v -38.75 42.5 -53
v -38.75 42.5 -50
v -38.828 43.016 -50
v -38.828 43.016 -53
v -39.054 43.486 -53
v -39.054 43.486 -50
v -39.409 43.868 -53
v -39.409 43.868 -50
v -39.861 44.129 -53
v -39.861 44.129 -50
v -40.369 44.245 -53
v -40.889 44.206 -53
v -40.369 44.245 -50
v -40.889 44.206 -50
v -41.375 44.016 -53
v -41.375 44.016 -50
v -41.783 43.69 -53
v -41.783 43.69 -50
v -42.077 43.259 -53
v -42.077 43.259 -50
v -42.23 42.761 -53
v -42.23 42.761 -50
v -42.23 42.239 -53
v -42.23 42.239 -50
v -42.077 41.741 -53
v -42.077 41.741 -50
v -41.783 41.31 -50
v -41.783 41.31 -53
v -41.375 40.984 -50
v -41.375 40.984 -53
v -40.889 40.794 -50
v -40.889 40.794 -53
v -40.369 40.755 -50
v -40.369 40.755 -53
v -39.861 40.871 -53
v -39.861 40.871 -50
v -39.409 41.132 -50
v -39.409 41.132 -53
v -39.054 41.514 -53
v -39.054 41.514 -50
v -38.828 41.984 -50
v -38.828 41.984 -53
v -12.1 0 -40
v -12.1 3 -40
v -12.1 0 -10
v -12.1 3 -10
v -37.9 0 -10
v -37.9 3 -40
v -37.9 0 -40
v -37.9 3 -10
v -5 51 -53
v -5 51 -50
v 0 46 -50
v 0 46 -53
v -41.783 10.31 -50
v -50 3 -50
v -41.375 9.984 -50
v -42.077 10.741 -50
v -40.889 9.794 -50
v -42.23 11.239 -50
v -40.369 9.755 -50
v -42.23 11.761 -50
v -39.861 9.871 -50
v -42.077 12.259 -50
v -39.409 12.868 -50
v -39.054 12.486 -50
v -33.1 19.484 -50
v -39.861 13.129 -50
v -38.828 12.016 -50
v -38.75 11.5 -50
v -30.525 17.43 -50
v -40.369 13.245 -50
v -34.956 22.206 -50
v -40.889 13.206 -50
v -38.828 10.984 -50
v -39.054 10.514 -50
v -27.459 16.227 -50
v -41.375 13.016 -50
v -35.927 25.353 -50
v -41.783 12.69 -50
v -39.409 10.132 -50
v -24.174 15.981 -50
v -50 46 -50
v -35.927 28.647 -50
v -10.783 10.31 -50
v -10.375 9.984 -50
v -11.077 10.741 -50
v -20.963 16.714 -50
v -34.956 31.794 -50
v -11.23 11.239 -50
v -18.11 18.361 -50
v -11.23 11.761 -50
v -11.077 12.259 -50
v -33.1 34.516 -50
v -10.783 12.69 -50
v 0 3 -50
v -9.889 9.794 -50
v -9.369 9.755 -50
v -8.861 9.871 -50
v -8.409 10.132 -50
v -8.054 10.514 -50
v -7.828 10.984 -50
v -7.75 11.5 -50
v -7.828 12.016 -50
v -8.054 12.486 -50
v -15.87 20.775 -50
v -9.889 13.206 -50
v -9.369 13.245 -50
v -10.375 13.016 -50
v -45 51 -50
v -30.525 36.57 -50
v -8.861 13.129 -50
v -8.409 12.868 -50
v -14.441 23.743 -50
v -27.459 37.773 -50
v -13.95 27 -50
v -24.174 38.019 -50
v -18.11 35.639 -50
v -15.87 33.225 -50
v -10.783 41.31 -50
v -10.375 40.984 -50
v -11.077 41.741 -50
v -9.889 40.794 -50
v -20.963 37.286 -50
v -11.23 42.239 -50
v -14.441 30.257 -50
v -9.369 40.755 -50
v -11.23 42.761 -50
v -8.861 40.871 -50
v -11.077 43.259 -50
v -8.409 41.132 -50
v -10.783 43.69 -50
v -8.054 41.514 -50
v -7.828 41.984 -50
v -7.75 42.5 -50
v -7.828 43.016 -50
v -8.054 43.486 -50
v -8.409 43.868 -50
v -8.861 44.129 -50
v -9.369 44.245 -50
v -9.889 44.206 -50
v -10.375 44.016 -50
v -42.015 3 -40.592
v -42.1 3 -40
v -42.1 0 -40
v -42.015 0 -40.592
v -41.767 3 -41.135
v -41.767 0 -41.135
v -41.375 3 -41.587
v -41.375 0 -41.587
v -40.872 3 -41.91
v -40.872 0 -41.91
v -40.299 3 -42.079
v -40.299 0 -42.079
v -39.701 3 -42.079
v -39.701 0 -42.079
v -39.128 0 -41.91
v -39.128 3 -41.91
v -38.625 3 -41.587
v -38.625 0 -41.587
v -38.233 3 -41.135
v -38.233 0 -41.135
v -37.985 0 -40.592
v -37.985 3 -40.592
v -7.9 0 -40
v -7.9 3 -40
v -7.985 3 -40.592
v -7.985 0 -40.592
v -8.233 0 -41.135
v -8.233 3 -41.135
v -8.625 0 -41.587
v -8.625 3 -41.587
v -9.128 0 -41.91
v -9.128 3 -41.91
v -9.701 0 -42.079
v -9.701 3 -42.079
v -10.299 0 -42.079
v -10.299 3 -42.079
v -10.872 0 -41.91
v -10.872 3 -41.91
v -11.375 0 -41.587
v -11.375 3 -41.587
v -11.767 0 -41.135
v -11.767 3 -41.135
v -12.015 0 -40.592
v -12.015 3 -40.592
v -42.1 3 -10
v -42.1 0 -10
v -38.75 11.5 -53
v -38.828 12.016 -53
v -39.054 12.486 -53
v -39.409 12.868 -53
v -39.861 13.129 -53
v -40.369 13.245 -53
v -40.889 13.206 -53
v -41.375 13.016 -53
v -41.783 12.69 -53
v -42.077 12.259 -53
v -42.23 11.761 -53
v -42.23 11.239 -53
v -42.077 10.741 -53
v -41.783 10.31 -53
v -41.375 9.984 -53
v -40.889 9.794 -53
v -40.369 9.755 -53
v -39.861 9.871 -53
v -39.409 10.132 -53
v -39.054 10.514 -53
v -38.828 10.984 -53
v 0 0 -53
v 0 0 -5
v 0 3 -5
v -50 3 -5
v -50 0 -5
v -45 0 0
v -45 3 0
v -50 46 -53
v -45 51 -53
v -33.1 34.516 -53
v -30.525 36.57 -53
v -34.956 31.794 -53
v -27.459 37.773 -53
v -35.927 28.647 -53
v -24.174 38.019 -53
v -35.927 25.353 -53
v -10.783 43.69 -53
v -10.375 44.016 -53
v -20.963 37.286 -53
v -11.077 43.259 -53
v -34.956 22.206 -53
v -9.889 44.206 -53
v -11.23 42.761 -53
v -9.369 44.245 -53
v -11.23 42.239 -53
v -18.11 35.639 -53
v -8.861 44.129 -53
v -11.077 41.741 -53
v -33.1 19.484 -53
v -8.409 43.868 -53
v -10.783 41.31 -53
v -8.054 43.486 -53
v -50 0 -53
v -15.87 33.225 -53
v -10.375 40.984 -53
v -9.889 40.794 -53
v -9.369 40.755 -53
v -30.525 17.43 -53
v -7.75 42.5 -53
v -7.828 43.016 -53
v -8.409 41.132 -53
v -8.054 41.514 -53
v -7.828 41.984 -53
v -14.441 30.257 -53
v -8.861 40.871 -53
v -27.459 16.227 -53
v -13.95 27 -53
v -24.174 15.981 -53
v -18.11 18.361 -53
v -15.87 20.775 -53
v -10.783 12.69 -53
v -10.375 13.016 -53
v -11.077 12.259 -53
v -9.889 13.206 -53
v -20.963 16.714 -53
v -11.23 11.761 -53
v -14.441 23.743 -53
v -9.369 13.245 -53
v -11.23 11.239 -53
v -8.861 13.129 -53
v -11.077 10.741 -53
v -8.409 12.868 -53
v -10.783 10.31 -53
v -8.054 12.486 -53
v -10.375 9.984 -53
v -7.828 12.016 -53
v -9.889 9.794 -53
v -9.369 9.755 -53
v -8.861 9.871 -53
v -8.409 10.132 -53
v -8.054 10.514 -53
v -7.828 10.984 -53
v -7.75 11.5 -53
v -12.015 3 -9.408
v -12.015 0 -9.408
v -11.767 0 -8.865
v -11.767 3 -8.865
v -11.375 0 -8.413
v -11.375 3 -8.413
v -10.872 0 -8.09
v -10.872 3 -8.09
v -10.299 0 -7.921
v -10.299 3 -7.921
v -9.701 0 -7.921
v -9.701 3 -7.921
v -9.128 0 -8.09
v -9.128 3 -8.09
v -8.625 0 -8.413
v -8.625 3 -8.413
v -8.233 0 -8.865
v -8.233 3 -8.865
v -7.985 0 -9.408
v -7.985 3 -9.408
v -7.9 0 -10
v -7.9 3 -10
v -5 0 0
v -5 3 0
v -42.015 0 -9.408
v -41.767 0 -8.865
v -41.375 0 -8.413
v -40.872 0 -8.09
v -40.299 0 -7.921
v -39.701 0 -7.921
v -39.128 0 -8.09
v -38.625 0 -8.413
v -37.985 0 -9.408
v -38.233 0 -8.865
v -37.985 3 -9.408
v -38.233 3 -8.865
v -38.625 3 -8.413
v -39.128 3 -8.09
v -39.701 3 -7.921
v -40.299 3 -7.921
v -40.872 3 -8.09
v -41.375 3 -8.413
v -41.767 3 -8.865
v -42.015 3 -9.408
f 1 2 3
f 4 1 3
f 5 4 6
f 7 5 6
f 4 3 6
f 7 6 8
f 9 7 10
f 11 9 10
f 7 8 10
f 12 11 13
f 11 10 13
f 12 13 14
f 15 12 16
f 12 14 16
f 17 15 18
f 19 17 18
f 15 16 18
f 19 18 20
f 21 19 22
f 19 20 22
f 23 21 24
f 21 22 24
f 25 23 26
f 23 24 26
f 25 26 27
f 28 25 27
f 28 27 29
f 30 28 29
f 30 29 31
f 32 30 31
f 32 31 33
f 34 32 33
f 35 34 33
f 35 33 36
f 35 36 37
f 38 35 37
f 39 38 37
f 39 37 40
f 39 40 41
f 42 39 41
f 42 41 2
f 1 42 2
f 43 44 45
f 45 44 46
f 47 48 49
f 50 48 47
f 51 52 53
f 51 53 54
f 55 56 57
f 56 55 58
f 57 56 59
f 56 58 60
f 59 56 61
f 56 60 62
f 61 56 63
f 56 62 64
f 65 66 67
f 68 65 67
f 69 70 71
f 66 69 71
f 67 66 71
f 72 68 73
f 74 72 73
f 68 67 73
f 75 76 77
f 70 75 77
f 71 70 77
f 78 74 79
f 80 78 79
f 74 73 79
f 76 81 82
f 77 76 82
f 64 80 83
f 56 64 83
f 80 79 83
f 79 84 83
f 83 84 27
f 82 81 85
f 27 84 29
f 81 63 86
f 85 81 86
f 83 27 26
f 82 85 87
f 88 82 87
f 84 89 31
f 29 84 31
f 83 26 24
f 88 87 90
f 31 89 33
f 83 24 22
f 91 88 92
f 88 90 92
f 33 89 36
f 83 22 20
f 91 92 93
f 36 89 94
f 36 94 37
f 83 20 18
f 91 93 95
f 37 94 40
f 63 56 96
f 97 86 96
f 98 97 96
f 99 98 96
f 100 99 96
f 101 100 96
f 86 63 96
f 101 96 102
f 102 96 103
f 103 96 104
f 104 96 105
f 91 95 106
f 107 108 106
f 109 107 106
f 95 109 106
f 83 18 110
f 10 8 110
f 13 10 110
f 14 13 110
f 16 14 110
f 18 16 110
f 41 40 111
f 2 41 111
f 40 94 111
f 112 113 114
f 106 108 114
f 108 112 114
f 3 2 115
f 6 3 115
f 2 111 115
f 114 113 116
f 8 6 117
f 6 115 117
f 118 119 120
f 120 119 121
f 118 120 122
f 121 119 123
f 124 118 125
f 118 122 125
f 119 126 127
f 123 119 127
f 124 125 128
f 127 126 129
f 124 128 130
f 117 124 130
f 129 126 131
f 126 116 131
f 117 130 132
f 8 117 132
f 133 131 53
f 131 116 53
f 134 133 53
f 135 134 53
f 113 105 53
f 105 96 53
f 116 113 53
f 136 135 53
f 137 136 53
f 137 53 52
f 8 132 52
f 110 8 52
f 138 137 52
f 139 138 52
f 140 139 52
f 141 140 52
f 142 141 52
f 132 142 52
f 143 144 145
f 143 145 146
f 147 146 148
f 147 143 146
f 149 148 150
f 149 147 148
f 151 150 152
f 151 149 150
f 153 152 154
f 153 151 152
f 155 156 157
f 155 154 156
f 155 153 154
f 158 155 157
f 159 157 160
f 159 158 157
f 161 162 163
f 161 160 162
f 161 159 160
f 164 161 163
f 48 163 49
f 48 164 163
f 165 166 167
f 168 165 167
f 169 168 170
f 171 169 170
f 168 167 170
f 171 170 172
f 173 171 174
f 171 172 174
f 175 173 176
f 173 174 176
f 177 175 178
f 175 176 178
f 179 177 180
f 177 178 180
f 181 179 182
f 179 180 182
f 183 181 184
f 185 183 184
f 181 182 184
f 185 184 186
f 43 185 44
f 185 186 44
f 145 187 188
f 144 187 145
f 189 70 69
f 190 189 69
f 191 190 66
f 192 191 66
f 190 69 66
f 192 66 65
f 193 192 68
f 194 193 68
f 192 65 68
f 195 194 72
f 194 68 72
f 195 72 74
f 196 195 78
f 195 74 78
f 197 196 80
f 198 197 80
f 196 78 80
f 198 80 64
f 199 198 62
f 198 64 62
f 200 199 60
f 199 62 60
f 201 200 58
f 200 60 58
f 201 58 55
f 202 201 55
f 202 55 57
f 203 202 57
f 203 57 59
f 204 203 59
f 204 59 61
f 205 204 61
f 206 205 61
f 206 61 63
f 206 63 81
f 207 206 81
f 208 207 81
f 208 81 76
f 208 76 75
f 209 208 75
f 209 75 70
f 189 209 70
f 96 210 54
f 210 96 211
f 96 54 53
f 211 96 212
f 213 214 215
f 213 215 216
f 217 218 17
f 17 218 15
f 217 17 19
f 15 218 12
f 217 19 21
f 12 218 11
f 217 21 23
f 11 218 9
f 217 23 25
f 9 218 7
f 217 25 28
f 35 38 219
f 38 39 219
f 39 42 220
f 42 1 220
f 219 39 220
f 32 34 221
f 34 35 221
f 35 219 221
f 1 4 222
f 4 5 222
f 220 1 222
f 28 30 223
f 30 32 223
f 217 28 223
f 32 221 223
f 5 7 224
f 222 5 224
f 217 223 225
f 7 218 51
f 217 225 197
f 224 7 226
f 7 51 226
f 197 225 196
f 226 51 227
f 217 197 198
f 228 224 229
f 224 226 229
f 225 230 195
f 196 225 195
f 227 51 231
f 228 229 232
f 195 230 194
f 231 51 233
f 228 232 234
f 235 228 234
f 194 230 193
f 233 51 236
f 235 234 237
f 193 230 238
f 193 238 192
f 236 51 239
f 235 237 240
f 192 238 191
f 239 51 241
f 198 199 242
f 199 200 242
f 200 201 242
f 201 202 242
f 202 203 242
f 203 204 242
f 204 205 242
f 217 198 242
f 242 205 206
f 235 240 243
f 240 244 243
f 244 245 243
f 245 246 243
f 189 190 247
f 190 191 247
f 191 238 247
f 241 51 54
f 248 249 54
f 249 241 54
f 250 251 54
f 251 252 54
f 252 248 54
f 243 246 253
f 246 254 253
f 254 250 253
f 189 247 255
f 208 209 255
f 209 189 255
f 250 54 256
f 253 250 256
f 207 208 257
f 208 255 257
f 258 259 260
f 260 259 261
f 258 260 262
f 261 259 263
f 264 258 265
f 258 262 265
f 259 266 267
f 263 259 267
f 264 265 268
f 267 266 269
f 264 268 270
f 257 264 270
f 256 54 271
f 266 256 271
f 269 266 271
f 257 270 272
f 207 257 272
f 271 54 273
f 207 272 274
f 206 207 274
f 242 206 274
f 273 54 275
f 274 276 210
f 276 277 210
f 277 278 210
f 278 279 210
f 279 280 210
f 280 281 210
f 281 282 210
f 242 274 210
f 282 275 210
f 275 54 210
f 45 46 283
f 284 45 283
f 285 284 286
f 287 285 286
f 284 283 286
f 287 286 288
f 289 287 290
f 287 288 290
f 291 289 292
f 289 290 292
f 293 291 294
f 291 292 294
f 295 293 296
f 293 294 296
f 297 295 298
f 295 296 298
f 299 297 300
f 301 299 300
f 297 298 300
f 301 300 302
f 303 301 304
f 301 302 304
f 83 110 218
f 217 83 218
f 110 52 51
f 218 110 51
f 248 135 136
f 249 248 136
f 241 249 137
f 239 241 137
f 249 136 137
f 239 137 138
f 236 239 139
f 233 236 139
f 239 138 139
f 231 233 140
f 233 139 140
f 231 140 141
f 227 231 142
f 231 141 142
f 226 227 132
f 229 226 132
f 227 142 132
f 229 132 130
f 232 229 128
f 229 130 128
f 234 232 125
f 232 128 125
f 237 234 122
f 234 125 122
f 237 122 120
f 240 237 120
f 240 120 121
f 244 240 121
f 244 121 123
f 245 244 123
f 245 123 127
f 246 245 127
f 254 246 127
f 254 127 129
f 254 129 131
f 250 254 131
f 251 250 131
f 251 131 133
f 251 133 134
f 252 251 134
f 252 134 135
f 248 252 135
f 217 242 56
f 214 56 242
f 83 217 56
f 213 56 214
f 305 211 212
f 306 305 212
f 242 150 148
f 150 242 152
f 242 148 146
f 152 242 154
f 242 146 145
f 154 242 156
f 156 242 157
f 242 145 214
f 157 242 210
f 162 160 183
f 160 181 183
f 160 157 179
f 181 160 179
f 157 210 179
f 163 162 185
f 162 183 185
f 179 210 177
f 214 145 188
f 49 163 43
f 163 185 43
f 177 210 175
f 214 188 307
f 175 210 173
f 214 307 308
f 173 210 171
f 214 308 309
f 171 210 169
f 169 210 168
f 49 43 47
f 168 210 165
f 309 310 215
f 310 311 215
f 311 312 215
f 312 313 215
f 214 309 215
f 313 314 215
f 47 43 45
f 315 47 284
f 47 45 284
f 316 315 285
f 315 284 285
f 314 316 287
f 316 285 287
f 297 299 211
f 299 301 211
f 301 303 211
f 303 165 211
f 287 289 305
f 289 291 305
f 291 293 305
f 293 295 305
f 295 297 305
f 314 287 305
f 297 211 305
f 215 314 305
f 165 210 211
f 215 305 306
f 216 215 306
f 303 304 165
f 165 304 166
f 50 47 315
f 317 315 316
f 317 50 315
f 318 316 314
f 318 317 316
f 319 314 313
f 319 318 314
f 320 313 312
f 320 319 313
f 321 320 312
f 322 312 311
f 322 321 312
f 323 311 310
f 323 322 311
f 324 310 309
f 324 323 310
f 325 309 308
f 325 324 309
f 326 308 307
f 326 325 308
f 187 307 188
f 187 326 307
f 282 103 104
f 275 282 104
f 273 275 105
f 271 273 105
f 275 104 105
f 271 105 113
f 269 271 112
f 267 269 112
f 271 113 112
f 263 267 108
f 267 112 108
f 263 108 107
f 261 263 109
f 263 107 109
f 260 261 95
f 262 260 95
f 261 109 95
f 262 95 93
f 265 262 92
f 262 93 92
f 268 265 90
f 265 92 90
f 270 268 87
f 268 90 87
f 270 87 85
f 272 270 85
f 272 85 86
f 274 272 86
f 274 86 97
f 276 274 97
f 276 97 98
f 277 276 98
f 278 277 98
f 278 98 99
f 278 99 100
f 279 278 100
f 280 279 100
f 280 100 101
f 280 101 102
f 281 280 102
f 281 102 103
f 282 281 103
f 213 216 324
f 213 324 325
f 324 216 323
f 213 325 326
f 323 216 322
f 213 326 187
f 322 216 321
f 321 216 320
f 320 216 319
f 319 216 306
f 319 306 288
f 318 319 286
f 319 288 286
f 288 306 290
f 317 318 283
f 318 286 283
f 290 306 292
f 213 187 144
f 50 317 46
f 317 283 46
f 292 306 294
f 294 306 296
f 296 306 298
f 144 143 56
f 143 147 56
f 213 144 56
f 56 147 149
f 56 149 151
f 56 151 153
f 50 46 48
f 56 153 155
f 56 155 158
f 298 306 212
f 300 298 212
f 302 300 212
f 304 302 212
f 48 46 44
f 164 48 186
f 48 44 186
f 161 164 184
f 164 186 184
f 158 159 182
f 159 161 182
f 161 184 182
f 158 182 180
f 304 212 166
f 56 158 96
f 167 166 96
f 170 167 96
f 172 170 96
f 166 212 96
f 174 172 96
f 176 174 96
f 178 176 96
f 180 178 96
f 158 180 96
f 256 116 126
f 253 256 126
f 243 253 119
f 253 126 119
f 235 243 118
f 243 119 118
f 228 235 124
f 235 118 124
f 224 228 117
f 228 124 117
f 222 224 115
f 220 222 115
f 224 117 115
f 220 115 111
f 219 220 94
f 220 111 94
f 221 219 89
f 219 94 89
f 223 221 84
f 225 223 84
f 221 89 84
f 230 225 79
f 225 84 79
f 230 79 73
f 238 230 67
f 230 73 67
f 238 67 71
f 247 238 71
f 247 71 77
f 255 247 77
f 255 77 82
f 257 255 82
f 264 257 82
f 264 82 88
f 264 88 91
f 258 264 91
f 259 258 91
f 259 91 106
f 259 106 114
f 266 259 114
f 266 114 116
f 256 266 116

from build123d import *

# Parameters (mm, degrees)
BOSS_EXTRUDE1_DEPTH = 50
CUT_EXTRUDE1_REACH  = 5
SKETCH2_R           = 11.05
SKETCH2_R_2         = 1.75
CUT_EXTRUDE2_REACH  = 5
CHAMFER1_SIZE       = 5


with BuildPart() as part:
    # Sketch1 → Boss-Extrude1 (new body)
    with BuildSketch(Plane(origin=(0, 0, 0), x_dir=(0, 0, -1), z_dir=(1, 0, 0))):
        Polygon((0, 0), (0, 3), (50, 3), (50, 51), (53, 51), (53, 0), align=None)
    extrude(amount=-BOSS_EXTRUDE1_DEPTH)

    # Sketch2 → Cut-Extrude1 (cut, up to next)
    with BuildSketch(Plane.XY.offset(-50), mode=Mode.PRIVATE) as cut_extrude1_sk1:
        with Locations((-25, 27)):
            Circle(SKETCH2_R)
    cut_extrude1_tool1 = extrude(cut_extrude1_sk1.sketch, amount=-CUT_EXTRUDE1_REACH, mode=Mode.PRIVATE) & part.part
    add(cut_extrude1_tool1.solids().sort_by_distance((-25, 27, -50))[0], mode=Mode.SUBTRACT)
    # Sketch2 → Cut-Extrude1 (cut, up to next)
    with BuildSketch(Plane.XY.offset(-50), mode=Mode.PRIVATE) as cut_extrude1_sk2:
        with Locations((-40.5, 42.5)):
            Circle(SKETCH2_R_2)
    cut_extrude1_tool2 = extrude(cut_extrude1_sk2.sketch, amount=-CUT_EXTRUDE1_REACH, mode=Mode.PRIVATE) & part.part
    add(cut_extrude1_tool2.solids().sort_by_distance((-40.5, 42.5, -50))[0], mode=Mode.SUBTRACT)
    # Sketch2 → Cut-Extrude1 (cut, up to next)
    with BuildSketch(Plane.XY.offset(-50), mode=Mode.PRIVATE) as cut_extrude1_sk3:
        with Locations((-9.5, 42.5)):
            Circle(SKETCH2_R_2)
    cut_extrude1_tool3 = extrude(cut_extrude1_sk3.sketch, amount=-CUT_EXTRUDE1_REACH, mode=Mode.PRIVATE) & part.part
    add(cut_extrude1_tool3.solids().sort_by_distance((-9.5, 42.5, -50))[0], mode=Mode.SUBTRACT)
    # Sketch2 → Cut-Extrude1 (cut, up to next)
    with BuildSketch(Plane.XY.offset(-50), mode=Mode.PRIVATE) as cut_extrude1_sk4:
        with Locations((-9.5, 11.5)):
            Circle(SKETCH2_R_2)
    cut_extrude1_tool4 = extrude(cut_extrude1_sk4.sketch, amount=-CUT_EXTRUDE1_REACH, mode=Mode.PRIVATE) & part.part
    add(cut_extrude1_tool4.solids().sort_by_distance((-9.5, 11.5, -50))[0], mode=Mode.SUBTRACT)
    # Sketch2 → Cut-Extrude1 (cut, up to next)
    with BuildSketch(Plane.XY.offset(-50), mode=Mode.PRIVATE) as cut_extrude1_sk5:
        with Locations((-40.5, 11.5)):
            Circle(SKETCH2_R_2)
    cut_extrude1_tool5 = extrude(cut_extrude1_sk5.sketch, amount=-CUT_EXTRUDE1_REACH, mode=Mode.PRIVATE) & part.part
    add(cut_extrude1_tool5.solids().sort_by_distance((-40.5, 11.5, -50))[0], mode=Mode.SUBTRACT)

    # Sketch3 → Cut-Extrude2 (cut, up to next)
    with BuildSketch(Plane(origin=(0, 3, 0), x_dir=(1, 0, 0), z_dir=(0, 1, 0)), mode=Mode.PRIVATE) as cut_extrude2_sk1:
        with BuildLine():
            Line((-37.9, 40), (-37.9, 10))
            ThreePointArc((-37.9, 10), (-40, 7.9), (-42.1, 10))
            Line((-42.1, 10), (-42.1, 40))
            ThreePointArc((-42.1, 40), (-40, 42.1), (-37.9, 40))
        make_face()
    cut_extrude2_tool1 = extrude(cut_extrude2_sk1.sketch, amount=-CUT_EXTRUDE2_REACH, mode=Mode.PRIVATE) & part.part
    add(cut_extrude2_tool1.solids().sort_by_distance((-40, 3, -25))[0], mode=Mode.SUBTRACT)
    # Sketch3 → Cut-Extrude2 (cut, up to next)
    with BuildSketch(Plane(origin=(0, 3, 0), x_dir=(1, 0, 0), z_dir=(0, 1, 0)), mode=Mode.PRIVATE) as cut_extrude2_sk2:
        with BuildLine():
            Line((-12.1, 40), (-12.1, 10))
            ThreePointArc((-12.1, 10), (-10, 7.9), (-7.9, 10))
            Line((-7.9, 10), (-7.9, 40))
            ThreePointArc((-7.9, 40), (-10, 42.1), (-12.1, 40))
        make_face()
    cut_extrude2_tool2 = extrude(cut_extrude2_sk2.sketch, amount=-CUT_EXTRUDE2_REACH, mode=Mode.PRIVATE) & part.part
    add(cut_extrude2_tool2.solids().sort_by_distance((-10, 3, -25))[0], mode=Mode.SUBTRACT)

    # Chamfer1
    chamfer1_edges = [part.edges().sort_by_distance(p)[0] for p in [
        (-50, 51, -51.5),
        (-50, 1.5, 0),
        (0, 1.5, 0),
        (0, 51, -51.5),
    ]]
    chamfer(chamfer1_edges, length=CHAMFER1_SIZE)


solid = part.part
